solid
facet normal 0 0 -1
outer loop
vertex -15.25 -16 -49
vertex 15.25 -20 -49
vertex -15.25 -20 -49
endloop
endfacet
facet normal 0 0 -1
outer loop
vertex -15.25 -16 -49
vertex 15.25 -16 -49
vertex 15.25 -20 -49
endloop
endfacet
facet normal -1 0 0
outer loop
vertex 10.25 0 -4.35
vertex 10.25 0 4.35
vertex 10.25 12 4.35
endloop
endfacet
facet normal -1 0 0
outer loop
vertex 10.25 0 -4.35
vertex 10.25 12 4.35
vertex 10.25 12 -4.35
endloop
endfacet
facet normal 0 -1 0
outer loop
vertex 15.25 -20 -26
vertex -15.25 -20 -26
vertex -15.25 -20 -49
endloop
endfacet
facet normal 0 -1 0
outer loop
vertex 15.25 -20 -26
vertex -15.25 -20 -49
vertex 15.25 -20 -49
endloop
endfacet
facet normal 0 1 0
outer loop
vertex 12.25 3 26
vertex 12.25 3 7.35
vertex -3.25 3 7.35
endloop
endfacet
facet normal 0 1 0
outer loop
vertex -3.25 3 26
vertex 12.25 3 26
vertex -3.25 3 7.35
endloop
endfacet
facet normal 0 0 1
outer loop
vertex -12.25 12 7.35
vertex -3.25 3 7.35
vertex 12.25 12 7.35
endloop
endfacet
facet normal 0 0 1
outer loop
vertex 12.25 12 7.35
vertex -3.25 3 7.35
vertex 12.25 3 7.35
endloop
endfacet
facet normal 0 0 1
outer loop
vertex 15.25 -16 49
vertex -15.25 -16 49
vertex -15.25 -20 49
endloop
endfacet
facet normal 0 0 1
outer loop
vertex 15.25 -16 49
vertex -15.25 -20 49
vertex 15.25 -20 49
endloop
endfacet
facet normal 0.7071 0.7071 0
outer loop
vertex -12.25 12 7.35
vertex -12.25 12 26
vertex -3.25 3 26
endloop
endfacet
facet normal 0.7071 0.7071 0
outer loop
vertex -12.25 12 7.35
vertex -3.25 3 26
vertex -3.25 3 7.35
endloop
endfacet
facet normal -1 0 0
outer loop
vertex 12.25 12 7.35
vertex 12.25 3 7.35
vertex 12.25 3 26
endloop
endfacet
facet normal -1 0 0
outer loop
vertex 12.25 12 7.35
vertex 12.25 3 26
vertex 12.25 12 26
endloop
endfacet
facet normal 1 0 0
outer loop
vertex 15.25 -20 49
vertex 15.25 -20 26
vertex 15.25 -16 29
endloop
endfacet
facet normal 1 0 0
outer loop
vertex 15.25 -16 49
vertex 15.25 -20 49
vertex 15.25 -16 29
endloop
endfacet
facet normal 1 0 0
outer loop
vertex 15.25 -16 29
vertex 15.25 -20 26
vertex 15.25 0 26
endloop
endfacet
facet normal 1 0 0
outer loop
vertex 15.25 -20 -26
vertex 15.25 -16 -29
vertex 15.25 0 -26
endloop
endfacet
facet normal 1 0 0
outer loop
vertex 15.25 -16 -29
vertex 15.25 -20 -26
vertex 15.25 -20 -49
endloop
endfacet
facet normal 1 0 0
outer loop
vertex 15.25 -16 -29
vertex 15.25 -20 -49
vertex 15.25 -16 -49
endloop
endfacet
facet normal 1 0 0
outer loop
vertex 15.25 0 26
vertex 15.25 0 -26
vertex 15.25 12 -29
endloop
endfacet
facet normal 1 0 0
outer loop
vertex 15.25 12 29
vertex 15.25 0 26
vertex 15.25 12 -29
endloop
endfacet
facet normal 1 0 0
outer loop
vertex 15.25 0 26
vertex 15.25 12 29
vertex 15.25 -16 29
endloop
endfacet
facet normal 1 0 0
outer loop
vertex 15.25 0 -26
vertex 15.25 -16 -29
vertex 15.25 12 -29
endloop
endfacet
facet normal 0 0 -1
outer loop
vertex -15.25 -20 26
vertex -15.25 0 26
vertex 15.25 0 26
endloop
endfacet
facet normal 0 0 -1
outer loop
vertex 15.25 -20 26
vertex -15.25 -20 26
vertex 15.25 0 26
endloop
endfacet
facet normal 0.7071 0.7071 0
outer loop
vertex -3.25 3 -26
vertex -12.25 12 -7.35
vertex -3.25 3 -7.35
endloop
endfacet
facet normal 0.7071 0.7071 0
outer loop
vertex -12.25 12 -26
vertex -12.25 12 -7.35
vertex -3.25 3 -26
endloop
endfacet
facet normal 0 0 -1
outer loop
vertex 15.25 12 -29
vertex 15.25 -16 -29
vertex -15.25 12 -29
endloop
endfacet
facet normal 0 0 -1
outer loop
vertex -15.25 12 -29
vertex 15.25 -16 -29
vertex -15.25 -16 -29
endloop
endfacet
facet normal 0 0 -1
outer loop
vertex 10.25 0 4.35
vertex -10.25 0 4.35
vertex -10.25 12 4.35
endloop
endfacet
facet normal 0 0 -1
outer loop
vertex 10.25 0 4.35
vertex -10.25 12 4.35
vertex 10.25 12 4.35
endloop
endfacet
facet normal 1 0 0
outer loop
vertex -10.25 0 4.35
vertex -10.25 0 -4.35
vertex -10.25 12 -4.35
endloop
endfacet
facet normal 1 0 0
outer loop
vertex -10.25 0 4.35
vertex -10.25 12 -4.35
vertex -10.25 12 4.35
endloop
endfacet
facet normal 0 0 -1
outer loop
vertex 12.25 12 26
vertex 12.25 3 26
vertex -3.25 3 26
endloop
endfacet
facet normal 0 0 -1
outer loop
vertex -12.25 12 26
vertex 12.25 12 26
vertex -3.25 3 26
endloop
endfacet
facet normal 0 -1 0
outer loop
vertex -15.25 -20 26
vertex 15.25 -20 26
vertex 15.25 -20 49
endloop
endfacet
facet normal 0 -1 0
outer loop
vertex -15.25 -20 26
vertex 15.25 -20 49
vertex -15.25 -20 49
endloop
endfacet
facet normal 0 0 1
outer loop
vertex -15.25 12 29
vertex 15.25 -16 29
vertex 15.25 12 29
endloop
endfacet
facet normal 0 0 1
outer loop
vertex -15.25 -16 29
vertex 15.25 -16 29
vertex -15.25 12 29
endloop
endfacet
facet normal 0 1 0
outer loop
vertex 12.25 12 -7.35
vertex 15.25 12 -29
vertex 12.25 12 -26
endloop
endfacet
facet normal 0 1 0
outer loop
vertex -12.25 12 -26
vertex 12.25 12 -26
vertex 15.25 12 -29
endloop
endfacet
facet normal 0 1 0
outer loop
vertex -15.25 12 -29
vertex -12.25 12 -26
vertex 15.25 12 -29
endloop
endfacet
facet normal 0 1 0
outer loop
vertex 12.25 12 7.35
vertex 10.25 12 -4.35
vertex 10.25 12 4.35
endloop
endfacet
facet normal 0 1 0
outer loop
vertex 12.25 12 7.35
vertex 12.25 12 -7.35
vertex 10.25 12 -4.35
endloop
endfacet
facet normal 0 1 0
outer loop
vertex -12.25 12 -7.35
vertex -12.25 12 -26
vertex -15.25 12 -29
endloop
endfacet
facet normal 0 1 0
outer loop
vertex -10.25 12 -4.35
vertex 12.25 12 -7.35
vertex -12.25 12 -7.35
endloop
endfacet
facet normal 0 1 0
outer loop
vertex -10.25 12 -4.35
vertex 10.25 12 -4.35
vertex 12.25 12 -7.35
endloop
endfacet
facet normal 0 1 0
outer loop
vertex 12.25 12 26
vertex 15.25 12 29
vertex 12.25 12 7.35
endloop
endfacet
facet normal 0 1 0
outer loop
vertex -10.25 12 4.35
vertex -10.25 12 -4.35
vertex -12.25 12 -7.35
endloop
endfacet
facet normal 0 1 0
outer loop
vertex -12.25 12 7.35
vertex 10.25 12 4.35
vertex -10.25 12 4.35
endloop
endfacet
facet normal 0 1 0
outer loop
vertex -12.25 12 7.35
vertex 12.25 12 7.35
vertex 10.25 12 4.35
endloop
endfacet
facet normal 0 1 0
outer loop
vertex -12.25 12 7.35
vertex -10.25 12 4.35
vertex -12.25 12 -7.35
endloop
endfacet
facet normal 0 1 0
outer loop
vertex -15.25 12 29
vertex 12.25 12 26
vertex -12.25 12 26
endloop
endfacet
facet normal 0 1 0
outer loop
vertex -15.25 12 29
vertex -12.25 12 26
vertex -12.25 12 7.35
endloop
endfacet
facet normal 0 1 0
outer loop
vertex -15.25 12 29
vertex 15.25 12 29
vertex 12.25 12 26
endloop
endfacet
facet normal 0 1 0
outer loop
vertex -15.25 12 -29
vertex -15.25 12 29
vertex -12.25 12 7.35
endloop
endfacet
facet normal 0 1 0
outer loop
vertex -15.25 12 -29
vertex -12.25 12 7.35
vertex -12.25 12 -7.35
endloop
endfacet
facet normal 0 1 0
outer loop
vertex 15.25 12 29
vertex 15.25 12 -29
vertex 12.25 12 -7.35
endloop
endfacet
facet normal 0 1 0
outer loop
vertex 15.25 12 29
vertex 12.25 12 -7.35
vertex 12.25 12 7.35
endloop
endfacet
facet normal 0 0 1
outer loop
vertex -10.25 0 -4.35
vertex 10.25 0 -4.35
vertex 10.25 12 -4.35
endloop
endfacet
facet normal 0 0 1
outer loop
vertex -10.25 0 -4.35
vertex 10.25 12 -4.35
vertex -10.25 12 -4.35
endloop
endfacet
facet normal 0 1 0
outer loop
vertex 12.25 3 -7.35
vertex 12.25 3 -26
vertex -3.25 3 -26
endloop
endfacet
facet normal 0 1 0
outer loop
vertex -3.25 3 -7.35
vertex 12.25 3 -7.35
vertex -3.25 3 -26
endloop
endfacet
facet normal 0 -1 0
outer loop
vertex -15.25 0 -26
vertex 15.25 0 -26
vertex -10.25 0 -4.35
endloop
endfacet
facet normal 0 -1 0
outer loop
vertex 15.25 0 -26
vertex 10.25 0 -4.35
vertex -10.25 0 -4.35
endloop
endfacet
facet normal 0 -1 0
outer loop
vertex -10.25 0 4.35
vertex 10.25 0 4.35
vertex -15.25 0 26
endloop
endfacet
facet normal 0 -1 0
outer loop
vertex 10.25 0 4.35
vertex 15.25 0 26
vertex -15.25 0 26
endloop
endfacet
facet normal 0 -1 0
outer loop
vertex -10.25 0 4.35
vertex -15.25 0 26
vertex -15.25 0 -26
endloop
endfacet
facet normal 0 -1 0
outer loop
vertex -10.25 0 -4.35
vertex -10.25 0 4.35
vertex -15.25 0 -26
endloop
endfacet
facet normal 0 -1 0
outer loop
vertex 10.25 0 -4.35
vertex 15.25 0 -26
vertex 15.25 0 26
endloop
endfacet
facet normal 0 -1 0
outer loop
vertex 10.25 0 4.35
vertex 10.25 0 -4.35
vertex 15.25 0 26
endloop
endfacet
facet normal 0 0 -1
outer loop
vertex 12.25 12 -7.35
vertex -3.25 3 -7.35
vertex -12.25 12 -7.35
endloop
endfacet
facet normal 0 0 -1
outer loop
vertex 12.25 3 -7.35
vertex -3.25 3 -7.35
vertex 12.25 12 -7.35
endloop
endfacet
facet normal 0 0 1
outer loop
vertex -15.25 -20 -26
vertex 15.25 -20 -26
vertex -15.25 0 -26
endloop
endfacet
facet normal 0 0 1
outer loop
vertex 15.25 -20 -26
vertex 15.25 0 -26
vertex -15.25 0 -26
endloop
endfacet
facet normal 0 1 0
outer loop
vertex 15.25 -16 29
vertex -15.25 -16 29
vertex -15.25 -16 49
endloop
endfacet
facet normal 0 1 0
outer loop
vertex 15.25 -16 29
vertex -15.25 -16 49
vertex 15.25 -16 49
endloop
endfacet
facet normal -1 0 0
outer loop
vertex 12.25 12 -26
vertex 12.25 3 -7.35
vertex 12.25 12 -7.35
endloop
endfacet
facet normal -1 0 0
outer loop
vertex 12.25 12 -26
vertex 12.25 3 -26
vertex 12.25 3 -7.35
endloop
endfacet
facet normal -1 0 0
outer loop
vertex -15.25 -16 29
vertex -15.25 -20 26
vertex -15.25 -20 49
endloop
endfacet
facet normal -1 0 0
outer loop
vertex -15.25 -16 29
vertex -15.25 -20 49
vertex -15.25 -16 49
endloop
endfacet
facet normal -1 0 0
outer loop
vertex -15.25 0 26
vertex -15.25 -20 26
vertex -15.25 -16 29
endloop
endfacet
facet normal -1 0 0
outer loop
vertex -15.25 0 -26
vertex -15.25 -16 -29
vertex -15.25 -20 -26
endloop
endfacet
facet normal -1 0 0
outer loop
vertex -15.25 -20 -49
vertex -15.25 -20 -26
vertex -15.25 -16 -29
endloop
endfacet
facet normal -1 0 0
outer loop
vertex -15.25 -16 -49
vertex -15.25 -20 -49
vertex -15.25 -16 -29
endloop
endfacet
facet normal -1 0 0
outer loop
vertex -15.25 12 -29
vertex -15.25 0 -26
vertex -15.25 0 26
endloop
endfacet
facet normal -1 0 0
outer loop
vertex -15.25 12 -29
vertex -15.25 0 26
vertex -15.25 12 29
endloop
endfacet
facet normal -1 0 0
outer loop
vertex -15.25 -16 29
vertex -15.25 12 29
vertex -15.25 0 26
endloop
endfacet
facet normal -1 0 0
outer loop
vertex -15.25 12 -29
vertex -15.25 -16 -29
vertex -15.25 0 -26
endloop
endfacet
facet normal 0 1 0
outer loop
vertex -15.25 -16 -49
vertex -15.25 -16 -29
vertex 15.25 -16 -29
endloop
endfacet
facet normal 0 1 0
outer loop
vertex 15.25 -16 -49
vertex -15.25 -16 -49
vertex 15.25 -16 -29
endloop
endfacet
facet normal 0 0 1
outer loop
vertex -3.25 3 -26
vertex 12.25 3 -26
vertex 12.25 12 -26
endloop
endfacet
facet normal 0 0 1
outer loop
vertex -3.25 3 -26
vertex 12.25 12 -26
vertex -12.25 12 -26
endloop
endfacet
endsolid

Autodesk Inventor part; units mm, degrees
ref_plane "YZ Plane" through (0, 0, 0) normal (1, 0, 0) x (0, 1, 0)
ref_plane "XZ Plane" through (0, 0, 0) normal (0, 1, 0) x (-1, 0, 0)
ref_plane "XY Plane" through (0, 0, 0) normal (0, 0, 1) x (1, 0, 0)
sketch "Sketch1" plane through (0, 0, 0) normal (0, 1, 0) x (-1, 0, 0)
  line L0 (10.25, 4.35) -> (-10.25, 4.35)
  line L1 (-10.25, 4.35) -> (-10.25, -4.35)
  line L2 (-10.25, -4.35) -> (10.25, -4.35)
  line L3 (10.25, -4.35) -> (10.25, 4.35)
  line L4 (15.25, 26) -> (-15.25, 26)
  line L5 (-15.25, 26) -> (-15.25, -26)
  line L6 (-15.25, -26) -> (15.25, -26)
  line L7 (15.25, -26) -> (15.25, 26)
  line L8 (15.25, 26) -> (-15.25, 26)
  line L9 (-15.25, 26) -> (-15.25, 29)
  line L10 (-15.25, 29) -> (15.25, 29)
  line L11 (15.25, 29) -> (15.25, 26)
  line L12 (15.25, -26) -> (-15.25, -26)
  line L13 (-15.25, -26) -> (-15.25, -29)
  line L14 (-15.25, -29) -> (15.25, -29)
  line L15 (15.25, -29) -> (15.25, -26)
  point P0 (0, 0)
  point P1 (0, 4.35)
  point P2 (10.25, 0)
  point P3 (0, 26)
  point P4 (15.25, 0)
  dimension "d0" = 8.7
  dimension "d1" = 20.5
  dimension "d2" = 52
  dimension "d3" = 5
  dimension "d4" = 3
  dimension "d5" = 3
extrude "Extrusion1" add sketch "Sketch1" along normal blind 12
extrude "Extrusion2" add sketch "Sketch1" against normal blind 20 contours L4 L9 L10 L11 | L15 L14 L13 L6
sketch "Sketch2" plane through (0, -20, 0) normal (0, -1, 0) x (1, 0, 0)
  point P0 (0, 0)
sketch "Sketch3" plane through (-15.25, 12, 29) normal (0, 0, 1) x (1, 0, 0)
  line L0 (30.5, -32) -> (30.5, 0) projected
  line L1 (0, 0) -> (30.5, 0) projected
  line L2 (0, -32) -> (0, 0) projected
  line L3 (30.5, -32) -> (0, -32) projected
  line L4 (0, -32) -> (0, 0) projected
  line L5 (30.5, -32) -> (0, -32)
  line L6 (0, -32) -> (0, -28)
  line L7 (0, -28) -> (30.5, -28)
  line L8 (30.5, -28) -> (30.5, -32)
  point P0 (15.25, -12)
  dimension "d10" = 4
sketch "Sketch4" plane through (15.25, 12, -29) normal (0, 0, -1) x (-1, 0, 0)
  line L0 (30.5, -32) -> (30.5, 0) projected
  line L1 (0, 0) -> (30.5, 0) projected
  line L2 (0, -32) -> (0, 0) projected
  line L3 (30.5, -32) -> (0, -32) projected
  line L4 (30.5, -32) -> (30.5, 0) projected
  line L5 (0, -32) -> (30.5, -32)
  line L6 (30.5, -32) -> (30.5, -28)
  line L7 (30.5, -28) -> (0, -28)
  line L8 (0, -28) -> (0, -32)
  point P0 (15.25, -12)
  dimension "d11" = 4
extrude "Extrusion3" add sketch "Sketch4" along normal blind 20 contours L3 L2 L7 L0
extrude "Extrusion4" add sketch "Sketch3" along normal blind 20 contours L3 L2 L7 L0
shell "Shell1" thickness 3 removed faces 1 at (-3.4167, 12, -20.7833)
chamfer "Chamfer1" distance 9 angle 45 2 edges at (-12.25, 3, -16.675) (-12.25, 3, 16.675)
properties part number "servo halter"
